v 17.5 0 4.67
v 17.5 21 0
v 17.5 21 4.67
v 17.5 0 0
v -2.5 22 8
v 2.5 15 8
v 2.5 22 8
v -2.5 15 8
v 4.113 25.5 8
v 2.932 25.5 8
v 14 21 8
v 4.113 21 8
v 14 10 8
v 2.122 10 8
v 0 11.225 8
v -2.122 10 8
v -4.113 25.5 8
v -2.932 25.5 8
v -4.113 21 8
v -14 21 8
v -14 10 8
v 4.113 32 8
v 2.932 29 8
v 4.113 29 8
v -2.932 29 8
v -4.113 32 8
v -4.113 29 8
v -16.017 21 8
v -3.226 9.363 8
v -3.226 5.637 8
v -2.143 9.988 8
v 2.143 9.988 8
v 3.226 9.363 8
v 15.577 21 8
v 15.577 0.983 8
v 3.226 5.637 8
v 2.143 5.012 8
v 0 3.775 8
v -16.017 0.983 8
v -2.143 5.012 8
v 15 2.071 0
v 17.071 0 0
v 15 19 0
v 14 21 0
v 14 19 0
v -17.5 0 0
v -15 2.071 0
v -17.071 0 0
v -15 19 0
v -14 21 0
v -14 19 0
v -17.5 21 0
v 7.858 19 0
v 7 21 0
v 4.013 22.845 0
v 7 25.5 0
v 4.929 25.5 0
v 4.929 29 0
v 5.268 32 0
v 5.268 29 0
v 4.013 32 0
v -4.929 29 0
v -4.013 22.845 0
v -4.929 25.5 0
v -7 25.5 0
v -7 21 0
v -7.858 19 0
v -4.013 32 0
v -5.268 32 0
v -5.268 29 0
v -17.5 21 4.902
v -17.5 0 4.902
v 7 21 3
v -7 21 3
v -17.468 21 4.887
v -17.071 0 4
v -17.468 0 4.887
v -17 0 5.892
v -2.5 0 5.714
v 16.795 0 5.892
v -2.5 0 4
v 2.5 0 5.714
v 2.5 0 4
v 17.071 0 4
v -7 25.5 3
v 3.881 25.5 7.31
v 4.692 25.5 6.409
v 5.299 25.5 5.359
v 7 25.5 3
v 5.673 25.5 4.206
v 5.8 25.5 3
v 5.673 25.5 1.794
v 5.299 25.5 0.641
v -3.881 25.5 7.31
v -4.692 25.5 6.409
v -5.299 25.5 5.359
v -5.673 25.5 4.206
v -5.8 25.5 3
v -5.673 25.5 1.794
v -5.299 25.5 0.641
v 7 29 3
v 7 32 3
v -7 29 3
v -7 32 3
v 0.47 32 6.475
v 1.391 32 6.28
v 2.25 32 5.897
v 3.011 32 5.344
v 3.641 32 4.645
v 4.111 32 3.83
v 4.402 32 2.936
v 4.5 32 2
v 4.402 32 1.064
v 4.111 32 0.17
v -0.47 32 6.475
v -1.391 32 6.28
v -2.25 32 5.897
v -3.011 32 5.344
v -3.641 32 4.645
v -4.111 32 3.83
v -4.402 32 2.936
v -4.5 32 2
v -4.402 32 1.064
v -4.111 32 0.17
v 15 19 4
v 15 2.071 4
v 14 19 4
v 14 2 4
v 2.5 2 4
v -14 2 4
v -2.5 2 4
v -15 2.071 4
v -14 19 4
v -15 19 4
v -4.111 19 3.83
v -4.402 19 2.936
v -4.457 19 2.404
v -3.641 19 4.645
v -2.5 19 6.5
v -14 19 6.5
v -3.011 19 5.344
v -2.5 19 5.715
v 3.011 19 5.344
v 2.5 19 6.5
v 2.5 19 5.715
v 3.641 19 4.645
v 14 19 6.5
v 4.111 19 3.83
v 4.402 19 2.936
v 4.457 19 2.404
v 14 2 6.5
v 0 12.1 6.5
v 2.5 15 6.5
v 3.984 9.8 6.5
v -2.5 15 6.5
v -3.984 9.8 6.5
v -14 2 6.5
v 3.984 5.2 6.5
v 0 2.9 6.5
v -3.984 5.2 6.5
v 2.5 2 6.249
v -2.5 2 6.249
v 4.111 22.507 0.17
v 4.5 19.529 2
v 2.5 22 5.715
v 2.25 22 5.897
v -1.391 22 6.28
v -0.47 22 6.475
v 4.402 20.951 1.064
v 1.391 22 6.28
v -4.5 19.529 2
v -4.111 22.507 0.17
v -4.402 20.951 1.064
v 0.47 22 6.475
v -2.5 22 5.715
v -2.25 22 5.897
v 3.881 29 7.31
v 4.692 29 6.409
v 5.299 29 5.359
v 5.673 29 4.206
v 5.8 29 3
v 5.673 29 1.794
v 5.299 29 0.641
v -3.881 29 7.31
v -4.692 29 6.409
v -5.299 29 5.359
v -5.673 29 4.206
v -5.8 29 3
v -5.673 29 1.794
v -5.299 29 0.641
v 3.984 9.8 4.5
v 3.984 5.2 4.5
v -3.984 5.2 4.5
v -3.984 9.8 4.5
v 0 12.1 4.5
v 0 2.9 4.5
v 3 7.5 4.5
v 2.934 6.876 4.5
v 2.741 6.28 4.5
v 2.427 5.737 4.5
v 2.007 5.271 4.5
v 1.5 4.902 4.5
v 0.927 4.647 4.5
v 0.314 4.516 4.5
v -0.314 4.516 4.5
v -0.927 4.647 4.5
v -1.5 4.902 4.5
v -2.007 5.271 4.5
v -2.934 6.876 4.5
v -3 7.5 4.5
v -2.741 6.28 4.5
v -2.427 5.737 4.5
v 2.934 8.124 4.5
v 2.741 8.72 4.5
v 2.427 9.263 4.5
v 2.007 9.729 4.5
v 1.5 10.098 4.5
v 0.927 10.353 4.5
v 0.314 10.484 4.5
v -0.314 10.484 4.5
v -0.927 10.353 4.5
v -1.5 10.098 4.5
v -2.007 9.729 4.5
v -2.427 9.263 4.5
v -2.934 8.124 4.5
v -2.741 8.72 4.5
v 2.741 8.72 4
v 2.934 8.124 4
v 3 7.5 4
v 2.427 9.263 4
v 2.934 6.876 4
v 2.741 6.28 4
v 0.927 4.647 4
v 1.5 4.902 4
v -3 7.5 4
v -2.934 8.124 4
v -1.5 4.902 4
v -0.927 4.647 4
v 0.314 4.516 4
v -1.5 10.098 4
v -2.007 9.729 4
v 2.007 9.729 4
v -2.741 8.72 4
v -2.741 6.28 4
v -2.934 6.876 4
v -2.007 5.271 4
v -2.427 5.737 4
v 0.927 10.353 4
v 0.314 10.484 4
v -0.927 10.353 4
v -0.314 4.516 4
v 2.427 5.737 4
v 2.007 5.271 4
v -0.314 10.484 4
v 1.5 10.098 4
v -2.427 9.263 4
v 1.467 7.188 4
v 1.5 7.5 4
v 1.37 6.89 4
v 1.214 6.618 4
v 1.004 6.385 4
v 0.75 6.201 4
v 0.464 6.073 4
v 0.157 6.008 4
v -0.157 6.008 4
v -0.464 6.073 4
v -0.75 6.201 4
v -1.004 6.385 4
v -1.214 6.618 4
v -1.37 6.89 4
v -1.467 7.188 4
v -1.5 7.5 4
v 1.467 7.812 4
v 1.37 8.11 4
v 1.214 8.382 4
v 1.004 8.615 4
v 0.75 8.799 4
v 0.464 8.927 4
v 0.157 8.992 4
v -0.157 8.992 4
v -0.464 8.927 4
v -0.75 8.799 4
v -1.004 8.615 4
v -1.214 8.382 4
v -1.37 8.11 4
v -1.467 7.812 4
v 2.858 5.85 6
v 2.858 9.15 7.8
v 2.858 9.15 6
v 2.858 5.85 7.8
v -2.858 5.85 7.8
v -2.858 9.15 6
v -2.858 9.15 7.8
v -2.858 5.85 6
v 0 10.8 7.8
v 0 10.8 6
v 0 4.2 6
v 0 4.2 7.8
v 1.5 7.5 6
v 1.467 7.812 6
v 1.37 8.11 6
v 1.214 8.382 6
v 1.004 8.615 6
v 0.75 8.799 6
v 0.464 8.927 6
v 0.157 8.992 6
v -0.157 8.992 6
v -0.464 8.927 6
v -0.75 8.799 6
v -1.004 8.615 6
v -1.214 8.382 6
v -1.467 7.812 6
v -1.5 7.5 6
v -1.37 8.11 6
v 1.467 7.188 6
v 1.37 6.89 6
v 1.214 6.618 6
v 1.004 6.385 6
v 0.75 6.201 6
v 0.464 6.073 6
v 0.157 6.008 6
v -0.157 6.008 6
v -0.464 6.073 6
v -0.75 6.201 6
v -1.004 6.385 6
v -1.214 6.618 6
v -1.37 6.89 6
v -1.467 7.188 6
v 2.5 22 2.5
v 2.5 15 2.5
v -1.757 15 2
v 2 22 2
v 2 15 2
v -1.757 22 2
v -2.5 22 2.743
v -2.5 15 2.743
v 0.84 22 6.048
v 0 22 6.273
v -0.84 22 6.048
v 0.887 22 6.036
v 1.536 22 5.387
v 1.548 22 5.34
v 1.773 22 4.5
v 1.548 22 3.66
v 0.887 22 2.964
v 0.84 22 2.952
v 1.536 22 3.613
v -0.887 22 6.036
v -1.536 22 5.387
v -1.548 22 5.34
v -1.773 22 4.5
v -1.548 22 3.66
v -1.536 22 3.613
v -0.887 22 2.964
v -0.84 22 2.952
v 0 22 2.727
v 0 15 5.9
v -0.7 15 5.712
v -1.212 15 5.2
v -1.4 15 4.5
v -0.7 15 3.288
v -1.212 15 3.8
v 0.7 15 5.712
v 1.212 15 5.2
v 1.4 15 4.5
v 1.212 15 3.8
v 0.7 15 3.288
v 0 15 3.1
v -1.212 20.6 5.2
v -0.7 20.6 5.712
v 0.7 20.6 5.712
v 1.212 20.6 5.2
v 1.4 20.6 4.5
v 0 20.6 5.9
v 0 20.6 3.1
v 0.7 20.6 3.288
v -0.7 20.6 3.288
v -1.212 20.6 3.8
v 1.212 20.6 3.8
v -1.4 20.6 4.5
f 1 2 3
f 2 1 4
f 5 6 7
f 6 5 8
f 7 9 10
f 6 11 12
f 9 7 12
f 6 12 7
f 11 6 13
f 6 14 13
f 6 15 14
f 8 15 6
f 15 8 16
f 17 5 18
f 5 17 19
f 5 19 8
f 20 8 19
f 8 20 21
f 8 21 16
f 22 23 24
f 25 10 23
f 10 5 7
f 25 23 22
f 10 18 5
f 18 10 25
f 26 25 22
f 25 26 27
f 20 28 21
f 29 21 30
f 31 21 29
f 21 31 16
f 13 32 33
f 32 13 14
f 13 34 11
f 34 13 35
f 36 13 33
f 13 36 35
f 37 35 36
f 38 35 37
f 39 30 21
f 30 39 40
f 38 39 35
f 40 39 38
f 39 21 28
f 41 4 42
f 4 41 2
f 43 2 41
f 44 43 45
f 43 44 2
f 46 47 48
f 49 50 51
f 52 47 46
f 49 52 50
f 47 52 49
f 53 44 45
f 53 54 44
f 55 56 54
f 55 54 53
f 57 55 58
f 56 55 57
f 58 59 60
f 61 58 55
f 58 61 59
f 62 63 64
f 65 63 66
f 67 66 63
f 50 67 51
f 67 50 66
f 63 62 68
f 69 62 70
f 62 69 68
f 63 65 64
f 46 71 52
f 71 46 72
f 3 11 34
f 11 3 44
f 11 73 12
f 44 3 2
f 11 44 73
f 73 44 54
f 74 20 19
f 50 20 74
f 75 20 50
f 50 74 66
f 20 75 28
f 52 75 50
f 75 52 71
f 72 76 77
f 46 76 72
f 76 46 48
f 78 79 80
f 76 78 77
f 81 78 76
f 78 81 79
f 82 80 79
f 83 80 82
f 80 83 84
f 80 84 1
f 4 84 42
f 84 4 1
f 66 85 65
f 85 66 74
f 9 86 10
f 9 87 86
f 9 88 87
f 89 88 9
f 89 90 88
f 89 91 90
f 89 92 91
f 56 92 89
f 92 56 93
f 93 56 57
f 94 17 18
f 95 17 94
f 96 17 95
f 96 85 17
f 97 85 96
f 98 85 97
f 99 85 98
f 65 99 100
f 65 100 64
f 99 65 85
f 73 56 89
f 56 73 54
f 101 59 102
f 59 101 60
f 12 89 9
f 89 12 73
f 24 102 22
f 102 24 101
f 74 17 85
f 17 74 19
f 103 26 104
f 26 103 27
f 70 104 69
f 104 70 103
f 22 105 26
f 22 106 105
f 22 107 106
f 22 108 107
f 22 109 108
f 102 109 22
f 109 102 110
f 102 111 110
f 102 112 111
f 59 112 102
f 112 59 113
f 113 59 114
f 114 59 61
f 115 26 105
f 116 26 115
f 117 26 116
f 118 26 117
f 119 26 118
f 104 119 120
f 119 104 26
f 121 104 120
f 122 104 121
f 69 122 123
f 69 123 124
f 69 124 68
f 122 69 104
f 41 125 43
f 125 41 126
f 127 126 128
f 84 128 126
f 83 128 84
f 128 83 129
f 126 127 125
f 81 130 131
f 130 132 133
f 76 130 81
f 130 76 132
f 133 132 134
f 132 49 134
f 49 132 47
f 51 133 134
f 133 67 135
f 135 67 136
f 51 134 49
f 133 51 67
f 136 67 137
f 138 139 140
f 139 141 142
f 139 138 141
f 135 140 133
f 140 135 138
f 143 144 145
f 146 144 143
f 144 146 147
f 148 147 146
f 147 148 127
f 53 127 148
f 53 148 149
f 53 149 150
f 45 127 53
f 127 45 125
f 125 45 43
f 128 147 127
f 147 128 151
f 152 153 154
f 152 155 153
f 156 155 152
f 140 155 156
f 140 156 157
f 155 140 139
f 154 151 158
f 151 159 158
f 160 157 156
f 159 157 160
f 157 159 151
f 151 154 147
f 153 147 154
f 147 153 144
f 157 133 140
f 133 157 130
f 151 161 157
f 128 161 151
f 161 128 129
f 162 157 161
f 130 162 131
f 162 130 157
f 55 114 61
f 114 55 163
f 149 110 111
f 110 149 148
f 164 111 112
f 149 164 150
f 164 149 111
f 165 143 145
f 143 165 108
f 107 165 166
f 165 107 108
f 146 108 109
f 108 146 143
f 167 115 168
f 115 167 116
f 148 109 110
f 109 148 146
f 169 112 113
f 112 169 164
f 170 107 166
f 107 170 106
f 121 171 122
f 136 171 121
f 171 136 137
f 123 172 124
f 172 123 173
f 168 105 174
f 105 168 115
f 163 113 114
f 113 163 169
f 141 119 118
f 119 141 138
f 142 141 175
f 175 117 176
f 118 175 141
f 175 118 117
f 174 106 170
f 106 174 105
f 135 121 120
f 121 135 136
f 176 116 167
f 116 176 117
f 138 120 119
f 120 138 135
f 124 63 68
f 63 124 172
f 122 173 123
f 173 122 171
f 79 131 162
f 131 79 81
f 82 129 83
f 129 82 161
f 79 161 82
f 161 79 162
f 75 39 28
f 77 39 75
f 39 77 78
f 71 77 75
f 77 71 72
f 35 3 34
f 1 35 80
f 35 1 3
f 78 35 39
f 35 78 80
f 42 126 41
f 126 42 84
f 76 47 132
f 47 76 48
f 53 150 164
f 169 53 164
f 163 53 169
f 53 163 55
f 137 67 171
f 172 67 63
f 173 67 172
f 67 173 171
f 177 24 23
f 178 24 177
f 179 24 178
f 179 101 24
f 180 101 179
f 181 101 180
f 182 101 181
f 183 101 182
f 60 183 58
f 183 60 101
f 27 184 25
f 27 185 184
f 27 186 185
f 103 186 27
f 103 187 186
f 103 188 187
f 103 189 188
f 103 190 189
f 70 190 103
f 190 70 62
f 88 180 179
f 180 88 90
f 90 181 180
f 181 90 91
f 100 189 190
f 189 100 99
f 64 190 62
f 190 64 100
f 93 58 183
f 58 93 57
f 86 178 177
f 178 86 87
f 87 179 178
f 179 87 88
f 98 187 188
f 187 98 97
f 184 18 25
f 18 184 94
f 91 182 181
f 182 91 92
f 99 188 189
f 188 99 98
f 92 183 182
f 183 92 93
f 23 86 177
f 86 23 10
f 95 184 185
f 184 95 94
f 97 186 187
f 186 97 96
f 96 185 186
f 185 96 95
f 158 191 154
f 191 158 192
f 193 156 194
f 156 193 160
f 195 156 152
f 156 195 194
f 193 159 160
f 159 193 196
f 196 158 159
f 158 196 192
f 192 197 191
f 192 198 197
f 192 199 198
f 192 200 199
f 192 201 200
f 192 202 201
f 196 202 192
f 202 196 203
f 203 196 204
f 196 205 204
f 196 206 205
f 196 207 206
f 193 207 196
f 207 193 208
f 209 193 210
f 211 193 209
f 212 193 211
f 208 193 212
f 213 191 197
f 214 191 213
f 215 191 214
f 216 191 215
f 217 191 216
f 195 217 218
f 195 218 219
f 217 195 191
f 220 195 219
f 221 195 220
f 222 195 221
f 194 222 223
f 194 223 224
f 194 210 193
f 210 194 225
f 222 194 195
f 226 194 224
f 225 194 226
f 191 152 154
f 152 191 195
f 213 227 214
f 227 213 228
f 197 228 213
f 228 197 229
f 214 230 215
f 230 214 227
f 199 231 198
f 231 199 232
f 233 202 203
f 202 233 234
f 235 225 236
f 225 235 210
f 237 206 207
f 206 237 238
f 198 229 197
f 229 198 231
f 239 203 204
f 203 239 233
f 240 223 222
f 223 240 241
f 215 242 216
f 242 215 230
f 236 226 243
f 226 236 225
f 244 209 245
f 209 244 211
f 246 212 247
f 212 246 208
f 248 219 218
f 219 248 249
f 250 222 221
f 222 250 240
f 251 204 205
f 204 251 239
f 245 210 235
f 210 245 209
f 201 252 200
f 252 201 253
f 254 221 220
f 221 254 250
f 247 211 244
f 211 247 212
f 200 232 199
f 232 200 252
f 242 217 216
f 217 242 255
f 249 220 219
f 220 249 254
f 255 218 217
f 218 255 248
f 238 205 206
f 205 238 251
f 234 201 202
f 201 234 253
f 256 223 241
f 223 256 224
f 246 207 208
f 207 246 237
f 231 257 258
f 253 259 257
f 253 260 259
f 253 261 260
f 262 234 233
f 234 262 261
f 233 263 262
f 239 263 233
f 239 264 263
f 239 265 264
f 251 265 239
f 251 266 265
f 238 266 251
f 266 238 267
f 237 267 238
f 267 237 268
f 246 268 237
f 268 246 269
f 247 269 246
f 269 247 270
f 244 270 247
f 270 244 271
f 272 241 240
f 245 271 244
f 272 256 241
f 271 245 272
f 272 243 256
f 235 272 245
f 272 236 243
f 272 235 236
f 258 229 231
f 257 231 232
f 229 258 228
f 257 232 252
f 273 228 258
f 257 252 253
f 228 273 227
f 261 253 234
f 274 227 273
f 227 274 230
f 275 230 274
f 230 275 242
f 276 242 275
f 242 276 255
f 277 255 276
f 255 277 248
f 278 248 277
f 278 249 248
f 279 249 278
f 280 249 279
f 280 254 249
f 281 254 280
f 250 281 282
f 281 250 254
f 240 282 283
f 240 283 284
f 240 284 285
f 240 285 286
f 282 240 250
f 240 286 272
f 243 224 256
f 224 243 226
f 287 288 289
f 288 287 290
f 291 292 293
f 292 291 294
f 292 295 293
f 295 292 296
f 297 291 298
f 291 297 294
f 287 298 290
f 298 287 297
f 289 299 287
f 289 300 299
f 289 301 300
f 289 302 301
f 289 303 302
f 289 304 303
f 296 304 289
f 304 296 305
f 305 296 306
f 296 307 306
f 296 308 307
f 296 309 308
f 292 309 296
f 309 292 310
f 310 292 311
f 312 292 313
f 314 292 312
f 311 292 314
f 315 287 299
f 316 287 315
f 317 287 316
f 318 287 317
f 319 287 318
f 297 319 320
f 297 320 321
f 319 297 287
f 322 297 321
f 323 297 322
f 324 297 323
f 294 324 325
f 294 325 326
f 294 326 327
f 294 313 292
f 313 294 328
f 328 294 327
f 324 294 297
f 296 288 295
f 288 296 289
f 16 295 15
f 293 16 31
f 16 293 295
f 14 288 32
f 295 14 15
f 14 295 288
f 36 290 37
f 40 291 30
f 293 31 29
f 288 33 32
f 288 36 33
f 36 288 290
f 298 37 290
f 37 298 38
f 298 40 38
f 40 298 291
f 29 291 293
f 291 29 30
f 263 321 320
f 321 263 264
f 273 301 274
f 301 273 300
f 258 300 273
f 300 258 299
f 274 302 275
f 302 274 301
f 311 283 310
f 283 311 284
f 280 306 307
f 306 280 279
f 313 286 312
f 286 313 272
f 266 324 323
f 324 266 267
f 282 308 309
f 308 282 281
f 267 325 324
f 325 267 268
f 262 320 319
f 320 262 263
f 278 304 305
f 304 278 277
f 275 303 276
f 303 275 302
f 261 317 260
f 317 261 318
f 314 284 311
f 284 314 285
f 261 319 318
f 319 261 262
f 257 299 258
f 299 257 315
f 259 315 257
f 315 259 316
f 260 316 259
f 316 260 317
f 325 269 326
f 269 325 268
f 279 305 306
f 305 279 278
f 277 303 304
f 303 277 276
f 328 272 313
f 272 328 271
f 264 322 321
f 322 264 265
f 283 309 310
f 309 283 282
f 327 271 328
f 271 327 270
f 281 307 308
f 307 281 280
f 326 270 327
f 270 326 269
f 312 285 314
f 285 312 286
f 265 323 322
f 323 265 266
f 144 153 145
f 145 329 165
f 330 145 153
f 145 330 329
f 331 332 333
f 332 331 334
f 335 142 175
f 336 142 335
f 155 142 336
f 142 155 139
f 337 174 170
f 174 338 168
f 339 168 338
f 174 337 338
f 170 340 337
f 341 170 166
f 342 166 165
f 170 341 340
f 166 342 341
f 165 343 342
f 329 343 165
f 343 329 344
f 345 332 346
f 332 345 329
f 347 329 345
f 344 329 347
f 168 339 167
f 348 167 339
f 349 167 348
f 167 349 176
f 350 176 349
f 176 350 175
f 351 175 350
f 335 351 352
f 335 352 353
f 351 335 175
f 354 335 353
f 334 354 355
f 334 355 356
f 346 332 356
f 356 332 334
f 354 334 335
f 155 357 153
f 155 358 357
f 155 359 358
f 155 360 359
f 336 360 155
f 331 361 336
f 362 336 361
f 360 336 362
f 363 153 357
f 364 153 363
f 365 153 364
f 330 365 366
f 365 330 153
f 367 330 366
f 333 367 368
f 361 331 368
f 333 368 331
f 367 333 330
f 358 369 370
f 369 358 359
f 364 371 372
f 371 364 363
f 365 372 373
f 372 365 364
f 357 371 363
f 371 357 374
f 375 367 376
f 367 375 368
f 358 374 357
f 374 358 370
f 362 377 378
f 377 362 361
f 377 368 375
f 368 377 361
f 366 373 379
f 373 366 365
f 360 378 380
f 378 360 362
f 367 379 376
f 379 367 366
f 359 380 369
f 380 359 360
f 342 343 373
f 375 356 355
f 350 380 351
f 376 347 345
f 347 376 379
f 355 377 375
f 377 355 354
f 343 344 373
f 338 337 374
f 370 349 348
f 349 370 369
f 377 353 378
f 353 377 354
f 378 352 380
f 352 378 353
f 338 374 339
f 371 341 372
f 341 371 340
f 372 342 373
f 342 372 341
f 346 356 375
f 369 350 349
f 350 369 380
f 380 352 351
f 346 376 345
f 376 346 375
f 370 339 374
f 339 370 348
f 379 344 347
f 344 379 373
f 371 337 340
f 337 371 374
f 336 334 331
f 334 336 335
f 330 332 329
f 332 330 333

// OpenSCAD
module cover()
{
    translate([ -17.5, 0, 0 ]) cube([ 35, 21, 8 ]);  // cover
    translate([ -7, 19, 0 ]) cube([ 3, 6.5, 3 ]);  // tube reinforcement
    translate([ 4, 19, 0 ]) cube([ 3, 6.5, 3 ]);  // tube reinforcement
    translate( [ 0 , 32 , 3 ] ) rotate( [90,0,0] ) cylinder( h = 12, r = 7, $fn=6);  // cable tube outer
}

module inside_cut(){
    translate([ -15, -1, -1 ]) cube( [30,20,5] );     // inside cut
    translate([ -14, 2, 4 ])  cube( [28,17,2.5 ] );     // inside cut
    
    translate( [ 0 , 32 , 2 ] ) rotate( [90,0,0] ) cylinder( h = 16, r = 4.5, $fn=30);  // cable tube inner
    
    translate([ -14, 10, -5 ])  cube( [28,25,5 ] );     // inside cut
    translate([ -14, 10, 8 ])  cube( [28,25,3 ] );     // inside cut
    
    translate([ -2.5, -6, 1 ])  rotate([15,0,0]) cube( [5,10,3 ] );     // LED
    
    translate([ -22, -5, 7 ]) rotate([0,25,0])  cube( [5,40,6 ] );     // corners
    translate([ 15, -5, 9 ]) rotate([0,60,0])  cube( [6,40,5 ] );     // corners
    translate([ 20, -5, 7 ]) rotate([0,25,90])  cube( [5,40,5 ] );     // corners
    
    translate([ 15, -5, -1 ]) rotate([0,0,45])  cube( [5,5,5 ] );     // corners
    translate([ -15, -5, -1 ]) rotate([0,0,45])  cube( [5,5,5 ] );     // corners
    
    
    translate([ 8, 13, -10]) rotate([0,-45,45])  cube( [10,10,10 ] );     // corners
    translate([ -8, 13, -10]) rotate([0,-45,-45])  cube( [10,10,10 ] );     // corners

    }

    module ziptie(){
        difference(){
        translate( [ 0 , 29 , 3 ] ) rotate( [90,0,0] ) cylinder( h = 3.5, r = 10, $fn=30);  // cable tube outer
        translate( [ 0 , 29 , 3 ] ) rotate( [90,0,0] ) cylinder( h = 3.5, r = 5.8, $fn=30);  // cable tube outer
        }
        }

    module filament_holder(){
        difference(){
        translate([ -2.5,15, 2 ]) rotate([0,0,0])  cube( [5,7,6 ] );     // body
        translate( [ 0 , 24 , 4.5 ] ) rotate( [90,0,0] ) cylinder( h = 10, r = 1.4, $fn=12);  // filament
        translate( [ 0 , 22.1 , 4.5 ] ) rotate( [90,0,0] ) cylinder( h = 1.5, r1 = 1.8, r2=1.4, $fn=12);  // filament

        translate([ -5,15, 1 ]) rotate([0,45,0])  cube( [3,15,3 ] );     // corners            
        translate([ 1,15, 1 ]) rotate([0,45,0])  cube( [3,15,3 ] );     // corners
        }
    }
    module m3_screw(){
        
    translate( [ 0 , 7.5 , 6 ] ) rotate( [0,0,90] ) cylinder( h = 2.5, r = 3.3, $fn=6);  // M3 HEAD
    translate( [ 0 , 7.5 , 7.8] ) rotate( [0,0,90] ) cylinder( h = 0.8, r1 = 3.3, r2=5, $fn=6);  // M3 HEAD
    translate( [ 0 , 7.5 , -10 ] ) rotate( [0,0,0] ) cylinder( h = 20, r = 1.5, $fn=30);  // M3 thread
    }
    
    module nut_trap(){
    translate( [ 0 , 7.5 , 4.5 ] ) rotate( [0,0,90] ) cylinder( h = 2.5, r = 4.6, $fn=6);  // M3 HEAD
    translate( [ 0 , 7.5 , 4 ] ) rotate( [0,0,0] ) cylinder( h = 1, r = 3, $fn=30);      
    }
    
    difference(){
    union(){
        difference(){
        cover();
        inside_cut();
            ziptie();
        }
        nut_trap();
    }   
    m3_screw();
    }
    
    filament_holder();
    
